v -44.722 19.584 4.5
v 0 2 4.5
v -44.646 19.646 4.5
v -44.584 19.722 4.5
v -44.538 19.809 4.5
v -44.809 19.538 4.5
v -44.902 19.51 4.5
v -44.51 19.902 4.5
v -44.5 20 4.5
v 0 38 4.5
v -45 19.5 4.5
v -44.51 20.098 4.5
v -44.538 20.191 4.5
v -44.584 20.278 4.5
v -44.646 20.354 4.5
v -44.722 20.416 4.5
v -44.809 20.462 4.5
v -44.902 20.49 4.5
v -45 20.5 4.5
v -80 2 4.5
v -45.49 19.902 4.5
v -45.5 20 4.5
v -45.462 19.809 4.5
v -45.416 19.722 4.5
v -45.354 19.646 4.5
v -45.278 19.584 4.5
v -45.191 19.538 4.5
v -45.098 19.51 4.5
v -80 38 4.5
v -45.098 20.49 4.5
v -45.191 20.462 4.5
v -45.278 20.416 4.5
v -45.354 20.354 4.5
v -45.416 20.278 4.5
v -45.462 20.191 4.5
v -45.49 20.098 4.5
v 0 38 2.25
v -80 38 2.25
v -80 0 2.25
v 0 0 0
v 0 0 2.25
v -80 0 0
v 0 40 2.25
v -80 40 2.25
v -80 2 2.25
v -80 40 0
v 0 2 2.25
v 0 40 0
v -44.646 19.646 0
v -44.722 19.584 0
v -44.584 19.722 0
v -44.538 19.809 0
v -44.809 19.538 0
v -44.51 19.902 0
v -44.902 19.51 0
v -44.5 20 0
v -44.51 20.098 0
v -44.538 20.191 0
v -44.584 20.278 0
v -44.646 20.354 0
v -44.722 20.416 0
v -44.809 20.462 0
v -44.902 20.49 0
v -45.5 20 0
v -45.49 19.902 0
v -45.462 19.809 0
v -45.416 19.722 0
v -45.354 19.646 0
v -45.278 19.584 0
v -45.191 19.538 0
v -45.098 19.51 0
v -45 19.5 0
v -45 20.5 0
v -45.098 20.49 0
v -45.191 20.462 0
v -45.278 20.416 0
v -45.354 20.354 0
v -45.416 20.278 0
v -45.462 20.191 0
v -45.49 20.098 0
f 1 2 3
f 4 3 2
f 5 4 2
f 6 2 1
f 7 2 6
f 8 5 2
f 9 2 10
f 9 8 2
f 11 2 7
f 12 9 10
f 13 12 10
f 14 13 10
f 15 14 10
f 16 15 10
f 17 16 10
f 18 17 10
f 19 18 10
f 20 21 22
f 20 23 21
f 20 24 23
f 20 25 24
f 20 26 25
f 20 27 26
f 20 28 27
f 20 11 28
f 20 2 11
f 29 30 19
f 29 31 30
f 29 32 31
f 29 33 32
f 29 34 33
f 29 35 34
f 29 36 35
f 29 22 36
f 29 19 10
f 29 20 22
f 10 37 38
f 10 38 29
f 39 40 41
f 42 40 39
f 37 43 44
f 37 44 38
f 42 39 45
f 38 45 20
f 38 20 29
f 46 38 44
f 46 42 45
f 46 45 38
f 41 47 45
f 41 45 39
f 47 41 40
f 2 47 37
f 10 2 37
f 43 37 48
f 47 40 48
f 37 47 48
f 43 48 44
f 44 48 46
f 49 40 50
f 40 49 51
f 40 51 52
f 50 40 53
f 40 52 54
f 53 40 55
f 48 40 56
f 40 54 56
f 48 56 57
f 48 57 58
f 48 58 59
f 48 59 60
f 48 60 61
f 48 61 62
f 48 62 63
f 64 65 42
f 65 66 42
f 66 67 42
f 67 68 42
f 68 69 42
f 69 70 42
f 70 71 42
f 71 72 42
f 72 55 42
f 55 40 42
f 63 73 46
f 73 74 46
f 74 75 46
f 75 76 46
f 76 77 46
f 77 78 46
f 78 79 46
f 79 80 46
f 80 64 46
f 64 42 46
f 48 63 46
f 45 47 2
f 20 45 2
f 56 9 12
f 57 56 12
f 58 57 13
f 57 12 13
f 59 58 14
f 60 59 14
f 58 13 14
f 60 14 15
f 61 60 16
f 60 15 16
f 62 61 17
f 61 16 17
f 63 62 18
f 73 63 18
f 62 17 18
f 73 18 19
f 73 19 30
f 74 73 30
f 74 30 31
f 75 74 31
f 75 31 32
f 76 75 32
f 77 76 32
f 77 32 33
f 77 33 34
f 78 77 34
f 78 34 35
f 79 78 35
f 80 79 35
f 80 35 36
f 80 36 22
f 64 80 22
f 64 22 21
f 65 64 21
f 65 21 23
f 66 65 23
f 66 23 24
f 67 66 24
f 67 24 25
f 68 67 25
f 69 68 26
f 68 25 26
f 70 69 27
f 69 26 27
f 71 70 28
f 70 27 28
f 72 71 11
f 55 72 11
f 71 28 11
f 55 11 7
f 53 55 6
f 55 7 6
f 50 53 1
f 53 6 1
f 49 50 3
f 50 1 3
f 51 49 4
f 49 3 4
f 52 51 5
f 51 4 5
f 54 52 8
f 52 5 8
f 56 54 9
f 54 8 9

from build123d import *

# Parameters (mm, degrees)
SKETCH1_W           = 40
SKETCH1_H           = 80
BOSS_EXTRUDE1_DEPTH = 4.5
SKETCH2_R           = 0.5
CUT_EXTRUDE1_DEPTH  = 90.555848497
SKETCH3_W           = 2
SKETCH3_H           = 2.25
CUT_EXTRUDE2_DEPTH  = 90.555848497


with BuildPart() as part:
    # Sketch1 → Boss-Extrude1 (new body)
    with BuildSketch(Plane(origin=(0, 0, 0), x_dir=(0, 1, 0), z_dir=(0, 0, 1))):
        with Locations((20, 40)):
            Rectangle(SKETCH1_W, SKETCH1_H)
    extrude(amount=BOSS_EXTRUDE1_DEPTH)

    # Sketch2 → Cut-Extrude1 (cut, through all)
    with BuildSketch(Plane.XY.offset(4.5)):
        with Locations((-45, 20)):
            Circle(SKETCH2_R)
    extrude(amount=-CUT_EXTRUDE1_DEPTH, mode=Mode.SUBTRACT)

    # Sketch3 → Cut-Extrude2 (cut, through all)
    with BuildSketch(Plane(origin=(-80, 0, 0), x_dir=(0, -1, 0), z_dir=(-1, 0, 0))):
        with Locations((-39, 3.375)):
            Rectangle(SKETCH3_W, SKETCH3_H)
        with Locations((-1, 3.375)):
            Rectangle(SKETCH3_W, SKETCH3_H)
    extrude(amount=-CUT_EXTRUDE2_DEPTH, mode=Mode.SUBTRACT)


solid = part.part
